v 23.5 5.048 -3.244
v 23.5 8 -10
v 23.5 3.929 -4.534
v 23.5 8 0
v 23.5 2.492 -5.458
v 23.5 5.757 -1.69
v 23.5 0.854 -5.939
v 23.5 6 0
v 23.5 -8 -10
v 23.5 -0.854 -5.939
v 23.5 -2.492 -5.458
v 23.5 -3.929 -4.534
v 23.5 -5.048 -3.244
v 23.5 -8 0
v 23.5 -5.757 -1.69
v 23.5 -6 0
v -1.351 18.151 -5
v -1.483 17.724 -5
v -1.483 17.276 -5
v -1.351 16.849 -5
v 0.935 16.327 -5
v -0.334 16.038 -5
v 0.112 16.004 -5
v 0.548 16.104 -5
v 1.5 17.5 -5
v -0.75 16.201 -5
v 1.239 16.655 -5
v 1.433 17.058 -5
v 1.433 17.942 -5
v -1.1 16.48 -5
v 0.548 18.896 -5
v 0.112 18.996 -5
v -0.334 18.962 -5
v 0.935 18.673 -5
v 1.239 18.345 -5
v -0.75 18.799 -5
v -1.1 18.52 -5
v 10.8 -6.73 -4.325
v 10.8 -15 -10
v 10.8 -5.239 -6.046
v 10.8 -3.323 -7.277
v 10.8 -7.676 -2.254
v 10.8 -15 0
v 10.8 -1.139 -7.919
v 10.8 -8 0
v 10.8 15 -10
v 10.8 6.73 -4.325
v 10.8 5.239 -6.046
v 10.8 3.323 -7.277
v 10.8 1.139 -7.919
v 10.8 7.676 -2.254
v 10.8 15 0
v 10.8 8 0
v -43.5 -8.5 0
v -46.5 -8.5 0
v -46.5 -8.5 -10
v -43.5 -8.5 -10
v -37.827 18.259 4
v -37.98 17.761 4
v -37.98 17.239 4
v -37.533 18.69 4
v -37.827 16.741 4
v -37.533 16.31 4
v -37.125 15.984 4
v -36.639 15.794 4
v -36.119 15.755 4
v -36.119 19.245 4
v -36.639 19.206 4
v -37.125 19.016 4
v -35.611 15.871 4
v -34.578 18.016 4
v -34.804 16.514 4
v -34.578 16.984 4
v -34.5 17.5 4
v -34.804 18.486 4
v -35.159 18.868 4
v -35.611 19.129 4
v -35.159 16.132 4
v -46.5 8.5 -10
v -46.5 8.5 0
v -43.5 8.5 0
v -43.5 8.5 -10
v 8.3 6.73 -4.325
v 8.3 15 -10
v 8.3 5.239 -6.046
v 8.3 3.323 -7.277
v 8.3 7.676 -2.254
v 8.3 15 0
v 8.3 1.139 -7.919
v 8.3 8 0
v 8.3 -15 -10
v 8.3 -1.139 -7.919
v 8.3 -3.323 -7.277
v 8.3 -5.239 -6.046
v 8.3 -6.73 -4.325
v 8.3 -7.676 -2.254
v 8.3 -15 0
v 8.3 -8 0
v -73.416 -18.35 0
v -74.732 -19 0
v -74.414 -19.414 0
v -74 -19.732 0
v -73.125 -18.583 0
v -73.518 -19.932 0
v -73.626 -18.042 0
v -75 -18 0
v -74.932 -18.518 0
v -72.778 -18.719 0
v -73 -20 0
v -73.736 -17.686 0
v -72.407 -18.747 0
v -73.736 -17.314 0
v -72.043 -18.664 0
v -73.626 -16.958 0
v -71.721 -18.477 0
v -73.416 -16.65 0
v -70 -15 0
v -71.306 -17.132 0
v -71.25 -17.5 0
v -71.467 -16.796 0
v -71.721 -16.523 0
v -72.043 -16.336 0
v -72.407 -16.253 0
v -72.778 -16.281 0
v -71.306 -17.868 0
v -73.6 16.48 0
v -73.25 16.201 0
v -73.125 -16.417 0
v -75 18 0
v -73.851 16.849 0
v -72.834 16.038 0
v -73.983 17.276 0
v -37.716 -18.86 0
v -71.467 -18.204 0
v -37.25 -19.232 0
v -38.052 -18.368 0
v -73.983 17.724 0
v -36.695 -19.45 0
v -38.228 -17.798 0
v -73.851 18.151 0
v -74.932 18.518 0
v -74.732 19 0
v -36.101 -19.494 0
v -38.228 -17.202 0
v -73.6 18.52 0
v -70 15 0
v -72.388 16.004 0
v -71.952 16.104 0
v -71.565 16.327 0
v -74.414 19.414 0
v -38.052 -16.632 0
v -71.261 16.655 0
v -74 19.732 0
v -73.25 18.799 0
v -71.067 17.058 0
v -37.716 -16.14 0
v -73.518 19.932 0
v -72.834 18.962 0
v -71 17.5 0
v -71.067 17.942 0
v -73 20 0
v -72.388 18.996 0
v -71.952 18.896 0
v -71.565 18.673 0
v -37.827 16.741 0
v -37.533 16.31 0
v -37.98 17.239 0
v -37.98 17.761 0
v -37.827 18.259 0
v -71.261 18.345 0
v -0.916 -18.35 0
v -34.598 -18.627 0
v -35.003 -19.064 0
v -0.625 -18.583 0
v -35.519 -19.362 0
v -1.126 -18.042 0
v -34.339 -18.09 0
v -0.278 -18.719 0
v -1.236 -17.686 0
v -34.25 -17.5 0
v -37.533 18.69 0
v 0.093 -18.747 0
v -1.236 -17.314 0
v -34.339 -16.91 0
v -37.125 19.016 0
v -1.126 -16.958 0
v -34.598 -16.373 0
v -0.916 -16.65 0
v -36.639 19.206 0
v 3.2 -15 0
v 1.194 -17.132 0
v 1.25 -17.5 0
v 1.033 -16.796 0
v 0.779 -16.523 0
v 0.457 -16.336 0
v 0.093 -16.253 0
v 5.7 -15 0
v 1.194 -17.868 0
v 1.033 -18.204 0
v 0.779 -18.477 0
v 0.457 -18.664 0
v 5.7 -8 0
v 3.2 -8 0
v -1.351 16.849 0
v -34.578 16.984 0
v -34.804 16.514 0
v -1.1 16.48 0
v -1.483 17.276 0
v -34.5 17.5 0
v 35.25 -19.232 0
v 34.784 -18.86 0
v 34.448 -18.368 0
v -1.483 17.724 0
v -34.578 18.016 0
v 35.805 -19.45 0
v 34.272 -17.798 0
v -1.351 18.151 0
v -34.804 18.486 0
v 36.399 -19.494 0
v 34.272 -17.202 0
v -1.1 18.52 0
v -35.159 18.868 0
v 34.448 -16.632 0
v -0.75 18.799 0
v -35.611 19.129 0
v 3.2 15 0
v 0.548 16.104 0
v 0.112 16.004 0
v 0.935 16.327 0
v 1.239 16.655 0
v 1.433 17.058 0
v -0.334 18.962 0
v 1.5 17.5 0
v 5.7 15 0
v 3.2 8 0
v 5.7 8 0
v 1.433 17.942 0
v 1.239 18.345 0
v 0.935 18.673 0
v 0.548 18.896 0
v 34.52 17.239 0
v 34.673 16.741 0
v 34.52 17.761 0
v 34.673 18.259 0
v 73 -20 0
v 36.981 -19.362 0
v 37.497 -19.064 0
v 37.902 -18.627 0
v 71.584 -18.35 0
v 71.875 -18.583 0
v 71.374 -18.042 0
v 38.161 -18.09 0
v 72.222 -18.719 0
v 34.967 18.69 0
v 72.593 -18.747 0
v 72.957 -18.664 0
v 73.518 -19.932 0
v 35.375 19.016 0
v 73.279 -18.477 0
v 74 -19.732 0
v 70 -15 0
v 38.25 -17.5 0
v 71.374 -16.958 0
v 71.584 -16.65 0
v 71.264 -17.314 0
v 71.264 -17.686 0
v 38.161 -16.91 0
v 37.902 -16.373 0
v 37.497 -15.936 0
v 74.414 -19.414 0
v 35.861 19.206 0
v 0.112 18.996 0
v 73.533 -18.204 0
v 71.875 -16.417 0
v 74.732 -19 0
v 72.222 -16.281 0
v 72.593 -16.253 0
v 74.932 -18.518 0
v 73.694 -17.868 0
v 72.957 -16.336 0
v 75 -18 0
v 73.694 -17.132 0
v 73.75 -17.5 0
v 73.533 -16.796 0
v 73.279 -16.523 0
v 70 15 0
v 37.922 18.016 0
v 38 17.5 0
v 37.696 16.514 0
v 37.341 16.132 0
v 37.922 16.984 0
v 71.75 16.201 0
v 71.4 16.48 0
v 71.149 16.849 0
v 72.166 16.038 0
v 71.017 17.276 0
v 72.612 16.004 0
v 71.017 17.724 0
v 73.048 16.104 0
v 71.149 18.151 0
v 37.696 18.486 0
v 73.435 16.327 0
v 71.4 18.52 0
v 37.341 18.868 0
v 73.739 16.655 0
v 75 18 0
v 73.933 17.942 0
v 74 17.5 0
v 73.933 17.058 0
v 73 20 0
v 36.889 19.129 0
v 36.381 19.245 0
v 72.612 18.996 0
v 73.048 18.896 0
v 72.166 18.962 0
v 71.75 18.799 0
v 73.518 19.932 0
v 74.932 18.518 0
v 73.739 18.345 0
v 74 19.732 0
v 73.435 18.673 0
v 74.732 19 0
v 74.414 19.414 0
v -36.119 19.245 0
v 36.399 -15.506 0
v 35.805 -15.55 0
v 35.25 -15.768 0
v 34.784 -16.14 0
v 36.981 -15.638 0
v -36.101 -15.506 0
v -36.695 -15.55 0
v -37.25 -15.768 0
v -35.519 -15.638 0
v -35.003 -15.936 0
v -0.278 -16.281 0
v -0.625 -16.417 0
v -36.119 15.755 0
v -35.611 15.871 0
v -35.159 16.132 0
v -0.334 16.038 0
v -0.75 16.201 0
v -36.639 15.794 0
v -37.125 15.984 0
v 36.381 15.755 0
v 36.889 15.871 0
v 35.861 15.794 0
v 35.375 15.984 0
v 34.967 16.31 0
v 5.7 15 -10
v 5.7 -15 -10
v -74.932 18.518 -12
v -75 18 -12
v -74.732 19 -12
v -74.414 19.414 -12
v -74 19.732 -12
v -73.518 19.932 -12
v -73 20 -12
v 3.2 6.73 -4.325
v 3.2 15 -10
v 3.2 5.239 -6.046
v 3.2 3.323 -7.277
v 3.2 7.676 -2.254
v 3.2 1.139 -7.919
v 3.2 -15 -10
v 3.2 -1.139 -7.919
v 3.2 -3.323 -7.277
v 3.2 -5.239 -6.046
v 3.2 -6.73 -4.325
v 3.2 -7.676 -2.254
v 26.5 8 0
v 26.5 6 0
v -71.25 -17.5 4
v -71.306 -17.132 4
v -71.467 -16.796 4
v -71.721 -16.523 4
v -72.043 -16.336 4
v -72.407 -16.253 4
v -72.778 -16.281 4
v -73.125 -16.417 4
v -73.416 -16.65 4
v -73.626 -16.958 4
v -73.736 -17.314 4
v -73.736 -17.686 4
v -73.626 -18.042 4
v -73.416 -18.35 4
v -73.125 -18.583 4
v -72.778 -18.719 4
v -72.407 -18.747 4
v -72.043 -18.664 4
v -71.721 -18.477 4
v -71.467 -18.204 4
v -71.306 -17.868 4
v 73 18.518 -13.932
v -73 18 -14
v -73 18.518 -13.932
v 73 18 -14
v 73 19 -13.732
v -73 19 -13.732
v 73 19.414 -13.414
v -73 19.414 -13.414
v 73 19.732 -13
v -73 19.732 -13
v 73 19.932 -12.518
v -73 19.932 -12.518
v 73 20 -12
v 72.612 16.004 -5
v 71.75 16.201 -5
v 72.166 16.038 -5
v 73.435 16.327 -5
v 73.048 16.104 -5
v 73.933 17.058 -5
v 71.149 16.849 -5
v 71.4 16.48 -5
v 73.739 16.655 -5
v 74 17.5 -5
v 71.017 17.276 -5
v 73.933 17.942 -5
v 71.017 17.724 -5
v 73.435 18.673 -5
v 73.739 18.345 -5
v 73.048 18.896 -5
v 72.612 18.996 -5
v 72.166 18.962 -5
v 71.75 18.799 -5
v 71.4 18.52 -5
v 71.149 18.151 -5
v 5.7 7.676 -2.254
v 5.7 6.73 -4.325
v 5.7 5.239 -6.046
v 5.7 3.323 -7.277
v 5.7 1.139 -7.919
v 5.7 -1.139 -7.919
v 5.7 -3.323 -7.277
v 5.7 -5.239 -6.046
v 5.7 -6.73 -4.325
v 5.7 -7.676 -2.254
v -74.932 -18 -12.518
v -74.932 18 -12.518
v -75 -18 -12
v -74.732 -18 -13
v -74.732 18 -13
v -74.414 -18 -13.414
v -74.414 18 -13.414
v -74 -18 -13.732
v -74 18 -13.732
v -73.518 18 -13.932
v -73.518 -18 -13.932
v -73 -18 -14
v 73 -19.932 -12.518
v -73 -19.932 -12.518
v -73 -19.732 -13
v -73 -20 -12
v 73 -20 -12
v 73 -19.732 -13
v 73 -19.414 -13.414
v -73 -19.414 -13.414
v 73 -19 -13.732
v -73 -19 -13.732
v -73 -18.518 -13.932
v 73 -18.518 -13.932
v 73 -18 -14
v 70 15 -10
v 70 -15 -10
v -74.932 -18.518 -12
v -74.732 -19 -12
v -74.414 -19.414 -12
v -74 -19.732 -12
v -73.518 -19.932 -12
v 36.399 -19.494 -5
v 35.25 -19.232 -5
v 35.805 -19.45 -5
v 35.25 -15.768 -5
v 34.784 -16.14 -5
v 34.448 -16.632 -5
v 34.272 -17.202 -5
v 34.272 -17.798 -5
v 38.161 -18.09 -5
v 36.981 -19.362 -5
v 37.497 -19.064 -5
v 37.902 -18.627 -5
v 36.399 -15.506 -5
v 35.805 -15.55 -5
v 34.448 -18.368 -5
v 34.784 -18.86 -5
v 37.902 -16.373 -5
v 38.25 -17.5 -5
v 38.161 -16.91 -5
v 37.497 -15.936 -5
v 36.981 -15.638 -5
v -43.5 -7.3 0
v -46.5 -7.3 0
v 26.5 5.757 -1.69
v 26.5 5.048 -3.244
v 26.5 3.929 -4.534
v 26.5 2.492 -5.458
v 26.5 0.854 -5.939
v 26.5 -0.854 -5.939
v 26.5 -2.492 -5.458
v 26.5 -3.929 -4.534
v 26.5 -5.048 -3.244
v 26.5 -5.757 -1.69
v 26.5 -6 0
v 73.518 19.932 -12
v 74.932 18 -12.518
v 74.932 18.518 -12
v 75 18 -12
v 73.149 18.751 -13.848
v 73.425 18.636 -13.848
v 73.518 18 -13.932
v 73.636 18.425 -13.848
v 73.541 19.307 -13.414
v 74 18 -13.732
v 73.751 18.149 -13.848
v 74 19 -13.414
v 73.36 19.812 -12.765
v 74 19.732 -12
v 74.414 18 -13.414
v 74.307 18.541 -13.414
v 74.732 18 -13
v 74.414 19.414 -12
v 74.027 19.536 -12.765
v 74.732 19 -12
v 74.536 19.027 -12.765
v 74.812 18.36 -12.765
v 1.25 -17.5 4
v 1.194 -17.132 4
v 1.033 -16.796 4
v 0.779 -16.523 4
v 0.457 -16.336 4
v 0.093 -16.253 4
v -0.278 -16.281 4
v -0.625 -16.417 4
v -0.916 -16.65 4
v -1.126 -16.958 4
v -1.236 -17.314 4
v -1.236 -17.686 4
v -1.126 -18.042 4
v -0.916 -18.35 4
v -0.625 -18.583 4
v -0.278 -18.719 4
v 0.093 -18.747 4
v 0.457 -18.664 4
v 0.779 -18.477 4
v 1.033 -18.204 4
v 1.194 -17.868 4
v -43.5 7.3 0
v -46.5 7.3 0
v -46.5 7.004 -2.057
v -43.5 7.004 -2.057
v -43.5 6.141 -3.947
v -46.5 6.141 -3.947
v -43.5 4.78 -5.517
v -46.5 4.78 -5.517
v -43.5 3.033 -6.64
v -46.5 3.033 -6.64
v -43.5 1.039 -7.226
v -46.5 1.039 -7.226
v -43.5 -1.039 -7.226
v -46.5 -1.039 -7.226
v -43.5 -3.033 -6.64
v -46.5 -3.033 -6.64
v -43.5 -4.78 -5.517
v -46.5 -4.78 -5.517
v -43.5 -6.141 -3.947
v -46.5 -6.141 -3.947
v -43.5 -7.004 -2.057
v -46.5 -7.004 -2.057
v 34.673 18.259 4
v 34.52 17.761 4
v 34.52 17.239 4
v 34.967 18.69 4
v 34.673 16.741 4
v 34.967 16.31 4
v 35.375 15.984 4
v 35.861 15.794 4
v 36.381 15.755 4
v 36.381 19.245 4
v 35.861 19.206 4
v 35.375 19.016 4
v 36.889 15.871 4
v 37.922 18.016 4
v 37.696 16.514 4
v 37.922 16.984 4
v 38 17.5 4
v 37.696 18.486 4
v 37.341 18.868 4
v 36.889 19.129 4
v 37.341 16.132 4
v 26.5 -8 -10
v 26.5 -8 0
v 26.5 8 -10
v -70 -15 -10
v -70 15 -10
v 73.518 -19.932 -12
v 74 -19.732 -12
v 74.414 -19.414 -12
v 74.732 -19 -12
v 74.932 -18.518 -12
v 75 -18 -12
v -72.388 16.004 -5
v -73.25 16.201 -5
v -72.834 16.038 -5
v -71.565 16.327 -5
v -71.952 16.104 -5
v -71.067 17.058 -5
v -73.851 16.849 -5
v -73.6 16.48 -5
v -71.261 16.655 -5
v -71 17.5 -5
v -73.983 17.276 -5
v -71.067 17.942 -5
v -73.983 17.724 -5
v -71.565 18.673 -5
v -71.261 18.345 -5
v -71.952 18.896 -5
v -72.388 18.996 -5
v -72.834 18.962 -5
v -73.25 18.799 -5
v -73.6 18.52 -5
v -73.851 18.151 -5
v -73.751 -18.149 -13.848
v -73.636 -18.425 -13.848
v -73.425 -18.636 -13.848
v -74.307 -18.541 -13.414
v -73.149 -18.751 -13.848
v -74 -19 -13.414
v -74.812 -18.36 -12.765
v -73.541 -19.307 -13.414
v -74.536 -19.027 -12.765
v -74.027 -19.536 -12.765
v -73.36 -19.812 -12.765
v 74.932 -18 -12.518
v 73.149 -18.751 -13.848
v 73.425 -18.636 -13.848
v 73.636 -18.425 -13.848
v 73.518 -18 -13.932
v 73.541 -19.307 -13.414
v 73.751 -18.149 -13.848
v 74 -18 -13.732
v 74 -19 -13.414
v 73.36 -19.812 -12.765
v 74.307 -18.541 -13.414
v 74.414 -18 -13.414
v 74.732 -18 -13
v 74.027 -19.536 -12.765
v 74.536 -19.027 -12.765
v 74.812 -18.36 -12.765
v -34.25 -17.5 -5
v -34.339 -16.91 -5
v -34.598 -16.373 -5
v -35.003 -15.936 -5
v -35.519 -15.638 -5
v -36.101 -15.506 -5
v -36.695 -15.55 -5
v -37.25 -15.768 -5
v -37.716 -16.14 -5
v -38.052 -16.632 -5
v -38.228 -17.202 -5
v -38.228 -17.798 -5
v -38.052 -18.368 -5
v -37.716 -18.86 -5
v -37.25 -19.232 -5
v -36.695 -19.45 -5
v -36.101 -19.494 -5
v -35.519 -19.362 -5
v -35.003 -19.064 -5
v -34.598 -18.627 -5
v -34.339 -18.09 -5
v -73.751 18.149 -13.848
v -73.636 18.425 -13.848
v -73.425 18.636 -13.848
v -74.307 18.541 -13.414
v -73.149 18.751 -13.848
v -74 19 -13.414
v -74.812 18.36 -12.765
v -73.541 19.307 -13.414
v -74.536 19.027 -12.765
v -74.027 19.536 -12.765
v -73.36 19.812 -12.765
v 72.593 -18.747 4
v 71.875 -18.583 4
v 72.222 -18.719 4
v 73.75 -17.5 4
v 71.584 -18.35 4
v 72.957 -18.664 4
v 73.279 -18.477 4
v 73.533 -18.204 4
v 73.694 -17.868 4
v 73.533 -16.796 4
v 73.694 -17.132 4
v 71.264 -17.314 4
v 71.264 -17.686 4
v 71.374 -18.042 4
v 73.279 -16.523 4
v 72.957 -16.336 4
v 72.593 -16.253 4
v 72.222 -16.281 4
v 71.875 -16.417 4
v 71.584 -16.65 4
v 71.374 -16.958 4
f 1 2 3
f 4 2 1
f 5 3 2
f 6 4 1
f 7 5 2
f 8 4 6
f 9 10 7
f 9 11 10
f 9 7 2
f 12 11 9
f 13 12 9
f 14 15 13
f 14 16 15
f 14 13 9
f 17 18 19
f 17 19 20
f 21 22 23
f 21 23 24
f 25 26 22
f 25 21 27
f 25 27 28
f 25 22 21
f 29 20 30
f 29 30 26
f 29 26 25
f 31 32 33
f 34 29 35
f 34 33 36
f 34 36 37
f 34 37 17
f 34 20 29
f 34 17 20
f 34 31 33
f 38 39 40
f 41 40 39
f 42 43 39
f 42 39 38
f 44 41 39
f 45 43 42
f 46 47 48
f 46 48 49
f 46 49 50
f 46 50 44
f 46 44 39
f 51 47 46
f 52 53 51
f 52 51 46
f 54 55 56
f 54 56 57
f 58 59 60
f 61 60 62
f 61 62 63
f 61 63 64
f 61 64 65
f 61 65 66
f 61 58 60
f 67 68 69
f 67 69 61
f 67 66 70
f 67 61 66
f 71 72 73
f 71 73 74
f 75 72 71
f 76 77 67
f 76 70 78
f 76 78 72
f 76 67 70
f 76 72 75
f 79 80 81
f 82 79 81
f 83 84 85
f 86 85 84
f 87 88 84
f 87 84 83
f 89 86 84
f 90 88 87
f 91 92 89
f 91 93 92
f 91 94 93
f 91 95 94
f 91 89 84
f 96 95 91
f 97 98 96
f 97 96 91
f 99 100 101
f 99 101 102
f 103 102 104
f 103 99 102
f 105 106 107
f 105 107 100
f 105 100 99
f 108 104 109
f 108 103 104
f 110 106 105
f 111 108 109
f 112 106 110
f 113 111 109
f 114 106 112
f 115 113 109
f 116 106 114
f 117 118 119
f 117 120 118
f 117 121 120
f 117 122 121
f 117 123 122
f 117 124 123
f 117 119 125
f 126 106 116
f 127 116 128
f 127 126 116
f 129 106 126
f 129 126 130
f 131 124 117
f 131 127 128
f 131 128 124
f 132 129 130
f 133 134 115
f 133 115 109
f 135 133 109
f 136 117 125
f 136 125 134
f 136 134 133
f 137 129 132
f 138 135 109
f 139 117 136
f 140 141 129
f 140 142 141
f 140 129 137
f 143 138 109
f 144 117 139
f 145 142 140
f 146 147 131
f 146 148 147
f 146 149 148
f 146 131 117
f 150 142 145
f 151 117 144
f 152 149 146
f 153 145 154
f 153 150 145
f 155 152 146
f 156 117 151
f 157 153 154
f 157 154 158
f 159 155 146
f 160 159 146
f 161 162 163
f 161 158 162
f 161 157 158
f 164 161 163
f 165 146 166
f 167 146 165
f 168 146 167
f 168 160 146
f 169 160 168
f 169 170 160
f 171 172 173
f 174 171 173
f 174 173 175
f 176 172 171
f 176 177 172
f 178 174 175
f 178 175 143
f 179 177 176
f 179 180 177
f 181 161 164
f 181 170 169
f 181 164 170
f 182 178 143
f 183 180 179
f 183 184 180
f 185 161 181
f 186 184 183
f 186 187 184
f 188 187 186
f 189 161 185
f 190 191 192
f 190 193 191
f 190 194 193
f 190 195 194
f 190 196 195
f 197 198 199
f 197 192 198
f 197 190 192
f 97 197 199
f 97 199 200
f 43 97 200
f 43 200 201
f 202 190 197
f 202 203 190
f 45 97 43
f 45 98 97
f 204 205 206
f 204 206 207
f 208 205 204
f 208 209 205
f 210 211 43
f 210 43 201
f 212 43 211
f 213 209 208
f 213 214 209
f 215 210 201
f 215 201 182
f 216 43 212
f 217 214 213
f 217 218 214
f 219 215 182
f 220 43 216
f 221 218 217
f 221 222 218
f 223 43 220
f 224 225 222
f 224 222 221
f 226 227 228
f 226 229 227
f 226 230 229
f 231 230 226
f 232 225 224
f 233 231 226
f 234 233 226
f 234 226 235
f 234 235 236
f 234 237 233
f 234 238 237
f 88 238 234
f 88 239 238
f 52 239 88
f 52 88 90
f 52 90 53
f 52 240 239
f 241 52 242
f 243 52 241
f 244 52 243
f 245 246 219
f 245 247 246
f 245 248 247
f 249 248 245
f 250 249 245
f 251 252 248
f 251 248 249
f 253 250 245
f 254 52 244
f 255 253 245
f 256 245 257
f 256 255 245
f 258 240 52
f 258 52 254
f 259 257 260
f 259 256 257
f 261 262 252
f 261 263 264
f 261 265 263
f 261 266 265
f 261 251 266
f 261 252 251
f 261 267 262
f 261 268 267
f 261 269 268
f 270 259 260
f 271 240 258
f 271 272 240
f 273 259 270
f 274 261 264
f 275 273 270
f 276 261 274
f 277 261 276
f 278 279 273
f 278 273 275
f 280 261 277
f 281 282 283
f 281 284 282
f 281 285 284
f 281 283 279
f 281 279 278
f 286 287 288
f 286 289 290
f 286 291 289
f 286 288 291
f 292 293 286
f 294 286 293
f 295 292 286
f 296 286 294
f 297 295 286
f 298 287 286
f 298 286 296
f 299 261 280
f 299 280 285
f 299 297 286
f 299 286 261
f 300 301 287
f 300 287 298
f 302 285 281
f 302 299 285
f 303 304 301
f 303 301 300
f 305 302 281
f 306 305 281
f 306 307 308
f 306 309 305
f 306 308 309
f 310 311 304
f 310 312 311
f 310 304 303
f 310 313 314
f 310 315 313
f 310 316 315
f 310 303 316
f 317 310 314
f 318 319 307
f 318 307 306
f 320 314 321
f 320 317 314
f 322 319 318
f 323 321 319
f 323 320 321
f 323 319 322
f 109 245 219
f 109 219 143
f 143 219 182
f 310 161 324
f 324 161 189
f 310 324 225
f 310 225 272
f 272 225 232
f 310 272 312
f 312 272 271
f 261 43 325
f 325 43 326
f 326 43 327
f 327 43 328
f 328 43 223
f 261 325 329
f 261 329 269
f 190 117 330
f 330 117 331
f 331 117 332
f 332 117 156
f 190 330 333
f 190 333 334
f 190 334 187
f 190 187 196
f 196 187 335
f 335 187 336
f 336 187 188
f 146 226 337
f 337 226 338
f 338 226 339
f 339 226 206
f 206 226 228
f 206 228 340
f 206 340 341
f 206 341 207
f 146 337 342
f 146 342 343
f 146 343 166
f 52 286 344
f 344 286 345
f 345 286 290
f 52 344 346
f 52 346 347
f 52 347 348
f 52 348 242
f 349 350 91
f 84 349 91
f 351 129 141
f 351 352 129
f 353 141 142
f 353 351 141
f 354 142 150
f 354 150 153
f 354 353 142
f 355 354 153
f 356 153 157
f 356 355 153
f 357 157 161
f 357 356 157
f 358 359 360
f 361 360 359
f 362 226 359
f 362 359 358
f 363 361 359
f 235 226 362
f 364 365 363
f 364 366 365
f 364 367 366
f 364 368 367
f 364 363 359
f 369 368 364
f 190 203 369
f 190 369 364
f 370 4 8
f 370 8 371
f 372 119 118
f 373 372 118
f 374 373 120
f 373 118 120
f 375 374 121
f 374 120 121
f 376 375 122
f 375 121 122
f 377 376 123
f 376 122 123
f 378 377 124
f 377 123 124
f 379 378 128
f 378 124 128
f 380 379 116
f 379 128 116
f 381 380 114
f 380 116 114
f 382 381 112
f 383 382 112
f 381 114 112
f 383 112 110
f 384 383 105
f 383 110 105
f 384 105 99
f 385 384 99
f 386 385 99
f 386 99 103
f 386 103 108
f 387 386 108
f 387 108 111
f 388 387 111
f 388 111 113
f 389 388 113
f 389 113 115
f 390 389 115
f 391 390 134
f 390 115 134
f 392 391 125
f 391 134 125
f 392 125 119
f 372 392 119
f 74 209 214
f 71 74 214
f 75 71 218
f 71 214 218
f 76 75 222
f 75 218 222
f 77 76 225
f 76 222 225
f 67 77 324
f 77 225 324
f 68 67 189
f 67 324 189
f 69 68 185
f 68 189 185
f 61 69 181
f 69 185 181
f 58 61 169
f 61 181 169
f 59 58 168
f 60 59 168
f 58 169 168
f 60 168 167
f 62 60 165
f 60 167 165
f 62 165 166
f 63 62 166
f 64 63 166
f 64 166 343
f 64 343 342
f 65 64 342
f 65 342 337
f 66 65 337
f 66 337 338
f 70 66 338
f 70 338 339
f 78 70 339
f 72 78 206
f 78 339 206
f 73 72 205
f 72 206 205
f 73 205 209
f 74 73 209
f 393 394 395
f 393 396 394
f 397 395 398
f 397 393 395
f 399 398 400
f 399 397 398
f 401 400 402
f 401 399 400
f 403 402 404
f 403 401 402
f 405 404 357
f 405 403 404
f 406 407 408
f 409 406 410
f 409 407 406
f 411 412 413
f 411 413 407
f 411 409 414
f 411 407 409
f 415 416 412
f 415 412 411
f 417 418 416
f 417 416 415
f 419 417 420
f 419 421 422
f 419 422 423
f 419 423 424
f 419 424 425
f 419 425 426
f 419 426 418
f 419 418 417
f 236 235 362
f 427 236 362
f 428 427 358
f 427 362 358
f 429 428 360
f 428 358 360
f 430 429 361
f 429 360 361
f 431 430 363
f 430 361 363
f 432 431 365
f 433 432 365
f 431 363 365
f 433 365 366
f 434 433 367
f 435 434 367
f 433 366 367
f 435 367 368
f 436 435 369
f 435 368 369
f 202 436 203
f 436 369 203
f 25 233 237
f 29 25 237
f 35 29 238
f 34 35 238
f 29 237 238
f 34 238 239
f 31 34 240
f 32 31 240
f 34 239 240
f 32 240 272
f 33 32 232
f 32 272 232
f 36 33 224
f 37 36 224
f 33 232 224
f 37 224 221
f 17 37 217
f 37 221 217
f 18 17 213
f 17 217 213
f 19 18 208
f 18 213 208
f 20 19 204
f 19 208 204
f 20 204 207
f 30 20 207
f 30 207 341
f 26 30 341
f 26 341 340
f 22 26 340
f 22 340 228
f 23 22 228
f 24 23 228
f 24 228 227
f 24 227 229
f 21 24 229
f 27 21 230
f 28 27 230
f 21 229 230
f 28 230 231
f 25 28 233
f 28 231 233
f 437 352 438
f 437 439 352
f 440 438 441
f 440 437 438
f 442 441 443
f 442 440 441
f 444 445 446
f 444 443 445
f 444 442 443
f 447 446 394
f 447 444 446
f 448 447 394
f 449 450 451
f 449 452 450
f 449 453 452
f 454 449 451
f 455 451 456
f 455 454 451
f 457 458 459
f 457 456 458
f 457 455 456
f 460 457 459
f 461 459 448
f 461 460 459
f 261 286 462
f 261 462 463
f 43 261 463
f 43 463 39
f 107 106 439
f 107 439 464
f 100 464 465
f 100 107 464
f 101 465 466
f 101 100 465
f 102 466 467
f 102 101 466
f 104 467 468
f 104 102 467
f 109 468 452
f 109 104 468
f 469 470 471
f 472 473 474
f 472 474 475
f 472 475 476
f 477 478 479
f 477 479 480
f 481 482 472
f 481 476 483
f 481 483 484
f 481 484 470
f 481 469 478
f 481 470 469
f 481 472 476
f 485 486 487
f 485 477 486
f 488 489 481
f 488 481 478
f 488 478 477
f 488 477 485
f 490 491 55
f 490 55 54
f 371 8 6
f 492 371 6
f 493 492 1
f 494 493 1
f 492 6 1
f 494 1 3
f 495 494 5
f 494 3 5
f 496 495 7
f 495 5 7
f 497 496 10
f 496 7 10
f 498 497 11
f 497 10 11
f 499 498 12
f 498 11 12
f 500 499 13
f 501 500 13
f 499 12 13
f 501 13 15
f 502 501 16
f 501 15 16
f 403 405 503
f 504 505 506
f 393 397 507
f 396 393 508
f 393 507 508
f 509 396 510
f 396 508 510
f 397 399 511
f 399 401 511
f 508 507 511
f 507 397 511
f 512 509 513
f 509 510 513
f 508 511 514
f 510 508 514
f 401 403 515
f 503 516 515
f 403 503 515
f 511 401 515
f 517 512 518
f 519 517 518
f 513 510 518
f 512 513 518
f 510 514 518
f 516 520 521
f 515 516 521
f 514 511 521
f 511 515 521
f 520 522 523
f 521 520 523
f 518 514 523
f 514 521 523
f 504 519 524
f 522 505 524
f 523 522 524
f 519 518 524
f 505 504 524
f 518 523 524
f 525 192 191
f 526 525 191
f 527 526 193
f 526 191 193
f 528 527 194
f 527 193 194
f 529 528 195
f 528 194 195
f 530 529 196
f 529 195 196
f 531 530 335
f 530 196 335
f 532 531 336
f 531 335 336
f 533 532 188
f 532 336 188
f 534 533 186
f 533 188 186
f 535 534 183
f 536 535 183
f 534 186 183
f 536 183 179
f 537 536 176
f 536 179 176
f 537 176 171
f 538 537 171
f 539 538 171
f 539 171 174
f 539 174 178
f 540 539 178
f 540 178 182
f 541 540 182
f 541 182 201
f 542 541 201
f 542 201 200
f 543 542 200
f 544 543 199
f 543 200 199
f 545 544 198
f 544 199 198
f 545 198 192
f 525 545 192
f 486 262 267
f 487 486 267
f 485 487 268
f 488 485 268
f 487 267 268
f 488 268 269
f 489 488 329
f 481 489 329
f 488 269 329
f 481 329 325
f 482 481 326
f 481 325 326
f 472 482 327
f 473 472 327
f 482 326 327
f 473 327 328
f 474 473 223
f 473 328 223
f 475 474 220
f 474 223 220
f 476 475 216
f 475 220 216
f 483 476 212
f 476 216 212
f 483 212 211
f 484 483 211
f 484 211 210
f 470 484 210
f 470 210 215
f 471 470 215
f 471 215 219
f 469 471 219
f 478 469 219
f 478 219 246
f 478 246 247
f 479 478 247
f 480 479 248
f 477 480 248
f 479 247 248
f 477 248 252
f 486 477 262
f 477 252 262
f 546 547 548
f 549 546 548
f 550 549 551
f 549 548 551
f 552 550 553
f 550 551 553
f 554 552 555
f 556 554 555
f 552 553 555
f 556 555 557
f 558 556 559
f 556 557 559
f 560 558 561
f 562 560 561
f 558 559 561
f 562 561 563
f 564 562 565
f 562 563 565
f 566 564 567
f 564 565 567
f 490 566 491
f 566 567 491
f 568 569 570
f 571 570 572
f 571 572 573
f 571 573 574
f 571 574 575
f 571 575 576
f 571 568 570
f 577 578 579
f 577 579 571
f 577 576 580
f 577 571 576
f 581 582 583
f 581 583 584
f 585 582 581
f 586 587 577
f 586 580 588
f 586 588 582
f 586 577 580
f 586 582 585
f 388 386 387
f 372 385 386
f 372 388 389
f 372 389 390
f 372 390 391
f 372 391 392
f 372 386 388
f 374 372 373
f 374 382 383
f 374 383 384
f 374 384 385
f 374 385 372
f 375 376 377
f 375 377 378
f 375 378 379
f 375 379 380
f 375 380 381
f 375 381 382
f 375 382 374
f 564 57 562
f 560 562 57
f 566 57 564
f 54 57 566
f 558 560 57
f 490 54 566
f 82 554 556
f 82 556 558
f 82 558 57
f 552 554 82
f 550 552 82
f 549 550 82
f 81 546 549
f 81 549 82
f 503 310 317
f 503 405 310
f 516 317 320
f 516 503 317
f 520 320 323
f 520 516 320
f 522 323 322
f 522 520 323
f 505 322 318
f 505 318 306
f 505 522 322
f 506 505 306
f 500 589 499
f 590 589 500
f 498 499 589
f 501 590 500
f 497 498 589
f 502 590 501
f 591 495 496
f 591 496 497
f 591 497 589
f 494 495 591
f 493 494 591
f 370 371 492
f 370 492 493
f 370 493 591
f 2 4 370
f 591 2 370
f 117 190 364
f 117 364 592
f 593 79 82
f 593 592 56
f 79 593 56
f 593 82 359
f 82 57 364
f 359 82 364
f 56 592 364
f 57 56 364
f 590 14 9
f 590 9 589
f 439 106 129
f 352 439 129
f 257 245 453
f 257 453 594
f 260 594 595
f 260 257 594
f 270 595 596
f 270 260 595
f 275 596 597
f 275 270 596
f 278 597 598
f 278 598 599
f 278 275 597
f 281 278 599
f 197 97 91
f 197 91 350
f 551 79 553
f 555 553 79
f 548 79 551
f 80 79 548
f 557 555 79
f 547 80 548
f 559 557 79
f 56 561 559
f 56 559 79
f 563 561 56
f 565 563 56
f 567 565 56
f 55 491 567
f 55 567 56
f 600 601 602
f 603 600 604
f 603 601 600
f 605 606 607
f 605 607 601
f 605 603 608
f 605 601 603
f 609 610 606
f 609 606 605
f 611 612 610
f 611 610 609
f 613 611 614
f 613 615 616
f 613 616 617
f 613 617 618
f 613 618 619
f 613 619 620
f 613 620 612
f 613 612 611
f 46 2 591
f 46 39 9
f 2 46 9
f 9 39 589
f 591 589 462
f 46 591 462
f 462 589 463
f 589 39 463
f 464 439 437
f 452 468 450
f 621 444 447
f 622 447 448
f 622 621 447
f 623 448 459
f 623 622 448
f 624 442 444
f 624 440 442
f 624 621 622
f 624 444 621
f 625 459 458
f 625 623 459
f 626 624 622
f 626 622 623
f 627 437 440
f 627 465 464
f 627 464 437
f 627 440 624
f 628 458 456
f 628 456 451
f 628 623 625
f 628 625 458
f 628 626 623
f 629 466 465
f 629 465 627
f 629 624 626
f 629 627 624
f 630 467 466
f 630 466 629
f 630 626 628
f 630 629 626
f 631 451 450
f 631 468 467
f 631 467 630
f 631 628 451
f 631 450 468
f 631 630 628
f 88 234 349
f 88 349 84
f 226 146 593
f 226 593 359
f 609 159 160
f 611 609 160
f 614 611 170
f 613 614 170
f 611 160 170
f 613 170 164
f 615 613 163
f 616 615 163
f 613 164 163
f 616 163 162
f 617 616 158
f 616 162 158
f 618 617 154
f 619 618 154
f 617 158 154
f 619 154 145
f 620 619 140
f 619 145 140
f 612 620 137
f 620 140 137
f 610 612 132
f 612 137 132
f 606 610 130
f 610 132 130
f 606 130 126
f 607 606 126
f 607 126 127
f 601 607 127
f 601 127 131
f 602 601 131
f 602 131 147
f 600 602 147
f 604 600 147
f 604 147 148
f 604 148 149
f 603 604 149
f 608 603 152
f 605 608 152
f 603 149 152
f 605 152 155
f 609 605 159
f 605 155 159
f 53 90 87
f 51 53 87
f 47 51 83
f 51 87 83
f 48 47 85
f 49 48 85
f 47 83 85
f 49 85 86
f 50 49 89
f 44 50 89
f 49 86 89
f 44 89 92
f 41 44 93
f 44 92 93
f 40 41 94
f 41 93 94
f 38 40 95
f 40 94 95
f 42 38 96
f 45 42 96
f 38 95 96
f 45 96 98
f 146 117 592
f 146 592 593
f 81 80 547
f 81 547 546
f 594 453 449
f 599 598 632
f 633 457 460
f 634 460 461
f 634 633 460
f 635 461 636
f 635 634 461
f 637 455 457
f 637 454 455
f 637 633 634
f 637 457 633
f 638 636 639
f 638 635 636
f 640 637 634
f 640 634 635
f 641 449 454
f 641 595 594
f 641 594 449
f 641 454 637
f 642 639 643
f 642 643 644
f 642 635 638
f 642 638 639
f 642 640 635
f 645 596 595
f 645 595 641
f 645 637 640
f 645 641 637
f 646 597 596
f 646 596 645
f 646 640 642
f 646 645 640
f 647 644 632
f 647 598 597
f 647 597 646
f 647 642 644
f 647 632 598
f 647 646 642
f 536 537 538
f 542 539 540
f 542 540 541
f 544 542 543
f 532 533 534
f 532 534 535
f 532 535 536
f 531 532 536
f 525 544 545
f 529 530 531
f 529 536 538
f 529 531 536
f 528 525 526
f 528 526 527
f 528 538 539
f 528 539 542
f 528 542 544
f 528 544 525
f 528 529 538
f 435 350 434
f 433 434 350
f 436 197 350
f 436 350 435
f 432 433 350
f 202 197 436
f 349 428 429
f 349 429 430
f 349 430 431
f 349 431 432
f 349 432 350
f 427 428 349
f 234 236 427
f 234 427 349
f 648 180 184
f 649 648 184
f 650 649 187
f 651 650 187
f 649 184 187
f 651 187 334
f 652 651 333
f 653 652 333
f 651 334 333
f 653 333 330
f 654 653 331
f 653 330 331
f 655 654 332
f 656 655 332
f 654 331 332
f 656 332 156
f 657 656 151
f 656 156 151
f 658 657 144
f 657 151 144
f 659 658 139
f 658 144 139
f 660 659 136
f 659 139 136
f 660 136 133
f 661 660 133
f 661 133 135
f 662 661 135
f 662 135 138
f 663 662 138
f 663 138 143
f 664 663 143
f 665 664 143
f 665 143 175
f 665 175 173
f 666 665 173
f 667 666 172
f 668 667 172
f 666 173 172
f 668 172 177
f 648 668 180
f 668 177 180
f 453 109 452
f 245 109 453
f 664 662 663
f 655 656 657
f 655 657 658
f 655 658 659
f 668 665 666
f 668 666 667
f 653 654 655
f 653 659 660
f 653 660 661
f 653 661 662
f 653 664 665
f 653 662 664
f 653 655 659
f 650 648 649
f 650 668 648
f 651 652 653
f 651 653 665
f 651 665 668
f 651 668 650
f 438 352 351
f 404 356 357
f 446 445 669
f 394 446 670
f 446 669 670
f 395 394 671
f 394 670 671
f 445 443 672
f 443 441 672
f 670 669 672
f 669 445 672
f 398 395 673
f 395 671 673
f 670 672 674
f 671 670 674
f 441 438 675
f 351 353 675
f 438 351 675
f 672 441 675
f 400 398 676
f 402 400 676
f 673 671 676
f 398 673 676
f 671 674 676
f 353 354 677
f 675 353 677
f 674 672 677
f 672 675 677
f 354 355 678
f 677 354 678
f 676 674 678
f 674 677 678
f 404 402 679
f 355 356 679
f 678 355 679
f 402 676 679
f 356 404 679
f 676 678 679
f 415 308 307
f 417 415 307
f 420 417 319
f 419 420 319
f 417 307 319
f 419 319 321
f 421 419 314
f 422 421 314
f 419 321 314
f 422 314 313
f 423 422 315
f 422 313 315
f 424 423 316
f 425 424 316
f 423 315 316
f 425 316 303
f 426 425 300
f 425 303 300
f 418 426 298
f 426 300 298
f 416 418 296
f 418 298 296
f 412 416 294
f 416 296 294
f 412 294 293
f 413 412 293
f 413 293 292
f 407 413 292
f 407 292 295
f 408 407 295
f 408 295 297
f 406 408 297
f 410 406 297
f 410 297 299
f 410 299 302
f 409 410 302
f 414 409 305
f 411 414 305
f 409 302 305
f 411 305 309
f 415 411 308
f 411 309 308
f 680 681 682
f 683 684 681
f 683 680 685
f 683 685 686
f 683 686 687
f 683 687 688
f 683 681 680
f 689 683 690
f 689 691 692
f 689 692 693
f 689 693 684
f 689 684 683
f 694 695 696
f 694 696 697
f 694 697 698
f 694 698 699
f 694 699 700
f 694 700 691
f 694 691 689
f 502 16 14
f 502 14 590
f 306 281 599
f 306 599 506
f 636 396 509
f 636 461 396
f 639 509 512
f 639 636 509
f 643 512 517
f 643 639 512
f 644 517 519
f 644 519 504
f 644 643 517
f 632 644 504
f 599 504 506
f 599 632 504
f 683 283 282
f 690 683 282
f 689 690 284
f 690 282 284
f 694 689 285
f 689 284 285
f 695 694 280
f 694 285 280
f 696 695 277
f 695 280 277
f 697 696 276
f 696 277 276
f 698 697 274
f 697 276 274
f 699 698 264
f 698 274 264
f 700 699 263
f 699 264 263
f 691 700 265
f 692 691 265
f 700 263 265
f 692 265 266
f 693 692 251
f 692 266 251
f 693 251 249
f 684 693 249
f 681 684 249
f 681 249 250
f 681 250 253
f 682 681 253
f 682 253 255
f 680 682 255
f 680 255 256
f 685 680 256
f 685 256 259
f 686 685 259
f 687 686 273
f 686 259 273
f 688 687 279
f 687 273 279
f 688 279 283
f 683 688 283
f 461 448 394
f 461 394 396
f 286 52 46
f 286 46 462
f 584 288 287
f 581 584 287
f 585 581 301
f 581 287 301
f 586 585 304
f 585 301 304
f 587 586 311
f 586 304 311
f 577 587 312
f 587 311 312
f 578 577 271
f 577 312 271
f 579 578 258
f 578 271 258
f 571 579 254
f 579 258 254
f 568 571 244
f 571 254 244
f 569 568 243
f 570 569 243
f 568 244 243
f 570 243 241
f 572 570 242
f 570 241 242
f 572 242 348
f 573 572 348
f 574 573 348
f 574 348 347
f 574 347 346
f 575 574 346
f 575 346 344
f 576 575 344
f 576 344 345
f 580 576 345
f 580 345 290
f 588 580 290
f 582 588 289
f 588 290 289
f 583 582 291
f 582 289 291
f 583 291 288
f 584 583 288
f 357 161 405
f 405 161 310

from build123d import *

# Parameters (mm, degrees)
F0_W      = 3
F0_H      = 1
F0_H_2    = 15
F1_DEPTH  = 10
F0_W_2    = 150.0000016391
F0_H_3    = 40.0000016391
F0_R      = 1.25
F0_R_2    = 2
F0_R_3    = 1.5
F0_R_4    = 1.75
F0_W_3    = 2.5
F0_H_4    = 7.5
F0_H_5    = 3
F0_H_6    = 10
F3_DEPTH  = 3
F5_DEPTH  = 7.6
F7_DEPTH  = 3
F8_DEPTH  = 4
F9_DEPTH  = 5
F10_W     = 150.0000016391
F10_H     = 40.0000016391
F10_W_2   = 73.2
F10_H_2   = 30
F10_W_3   = 2.6
F10_W_4   = 59.2
F11_DEPTH = 4
F13_R     = 2


with BuildPart() as f1:
    # F0 (on Top) → F1 (new body)
    with BuildSketch(Plane.XY):
        with Locations((-45, 8)):
            Rectangle(F0_W, F0_H)
        with Locations((-45, 0)):
            Rectangle(F0_W, F0_H_2)
        with Locations((-45, -8)):
            Rectangle(F0_W, F0_H)
    extrude(amount=-F1_DEPTH)

    # F2 (on face) → F3 (cut, through all)
    with BuildSketch(Plane(origin=(-46.5, 0, 0), x_dir=(0, -1, 0), z_dir=(-1, 0, 0))):
        with BuildLine():
            ThreePointArc((-7.3, 0), (0, -7.3), (7.3, 0))
            Line((7.3, 0), (-7.3, 0))
        make_face()
    extrude(amount=-F3_DEPTH, mode=Mode.SUBTRACT)


with BuildPart() as f1b:
    # F0 (on Top) → F1, piece 2 (new body)
    with BuildSketch(Plane.XY):
        Rectangle(F0_W_2, F0_H_3)
        with Locations((-72.5000004098, -17.5000004098)):
            Circle(F0_R, mode=Mode.SUBTRACT)
        with Locations((-36.2500004098, -17.5000004098)):
            Circle(F0_R_2, mode=Mode.SUBTRACT)
        with Locations((-4.098e-07, -17.5000004098)):
            Circle(F0_R, mode=Mode.SUBTRACT)
        with Locations((36.2499995902, -17.5000004098)):
            Circle(F0_R_2, mode=Mode.SUBTRACT)
        with Locations((72.4999995902, -17.5000004098)):
            Circle(F0_R, mode=Mode.SUBTRACT)
        Polygon((-70, -15), (-70, 15), (3.2, 15), (5.7, 15), (8.3, 15), (10.8, 15), (70, 15), (70, -15), (10.8, -15), (8.3, -15), (5.7, -15), (3.2, -15), align=None, mode=Mode.SUBTRACT)
        with Locations((-72.5000004098, 17.4999995902)):
            Circle(F0_R_3, mode=Mode.SUBTRACT)
        with Locations((-36.2500004098, 17.4999995902)):
            Circle(F0_R_4, mode=Mode.SUBTRACT)
        with Locations((-4.098e-07, 17.4999995902)):
            Circle(F0_R_3, mode=Mode.SUBTRACT)
        with Locations((36.2499995902, 17.4999995902)):
            Circle(F0_R_4, mode=Mode.SUBTRACT)
        with Locations((72.4999995902, 17.4999995902)):
            Circle(F0_R_3, mode=Mode.SUBTRACT)
        with Locations((9.55, 0)):
            Rectangle(F0_W_3, F0_H_2)
        with Locations((4.45, 0)):
            Rectangle(F0_W_3, F0_H_2)
        with Locations((4.45, 11.25)):
            Rectangle(F0_W_3, F0_H_4)
        with Locations((9.55, 11.25)):
            Rectangle(F0_W_3, F0_H_4)
        with Locations((4.45, -11.25)):
            Rectangle(F0_W_3, F0_H_4)
        with Locations((9.55, -11.25)):
            Rectangle(F0_W_3, F0_H_4)
        with Locations((-36.2500004098, -17.5000004098)):
            Circle(F0_R_2)
        with Locations((36.2499995902, -17.5000004098)):
            Circle(F0_R_2)
        with Locations((-36.2500004098, 17.4999995902)):
            Circle(F0_R_4)
        with Locations((36.2499995902, 17.4999995902)):
            Circle(F0_R_4)
        with Locations((72.4999995902, 17.4999995902)):
            Circle(F0_R_3)
        with Locations((-4.098e-07, 17.4999995902)):
            Circle(F0_R_3)
        with Locations((-72.5000004098, 17.4999995902)):
            Circle(F0_R_3)
        with Locations((-72.5000004098, -17.5000004098)):
            Circle(F0_R)
        with Locations((-4.098e-07, -17.5000004098)):
            Circle(F0_R)
        with Locations((72.4999995902, -17.5000004098)):
            Circle(F0_R)
    extrude(amount=-F1_DEPTH)

    # F4 (on face) → F5 (cut, through all)
    with BuildSketch(Plane(origin=(3.2, 0, 0), x_dir=(0, -1, 0), z_dir=(-1, 0, 0))):
        with BuildLine():
            ThreePointArc((-8, 0), (0, -8), (8, 0))
            Line((8, 0), (-8, 0))
        make_face()
    extrude(amount=-F5_DEPTH, mode=Mode.SUBTRACT)

    # F0 (on Top) → F8 (join)
    with BuildSketch(Plane.XY):
        with Locations((-72.5000004098, -17.5000004098)):
            Circle(F0_R)
        with Locations((-4.098e-07, -17.5000004098)):
            Circle(F0_R)
        with Locations((72.4999995902, -17.5000004098)):
            Circle(F0_R)
        with Locations((-36.2500004098, 17.4999995902)):
            Circle(F0_R_4)
        with Locations((36.2499995902, 17.4999995902)):
            Circle(F0_R_4)
    extrude(amount=F8_DEPTH)

    # F0 (on Top) → F9 (cut)
    with BuildSketch(Plane.XY):
        with Locations((-4.098e-07, 17.4999995902)):
            Circle(F0_R_3)
        with Locations((72.4999995902, 17.4999995902)):
            Circle(F0_R_3)
        with Locations((-72.5000004098, 17.4999995902)):
            Circle(F0_R_3)
        with Locations((-36.2500004098, -17.5000004098)):
            Circle(F0_R_2)
        with Locations((36.2499995902, -17.5000004098)):
            Circle(F0_R_2)
    extrude(amount=-F9_DEPTH, mode=Mode.SUBTRACT)


with BuildPart() as f1c:
    # F0 (on Top) → F1, piece 3 (new body)
    with BuildSketch(Plane.XY):
        with Locations((25, 6.5)):
            Rectangle(F0_W, F0_H_5)
        with Locations((25, 0)):
            Rectangle(F0_W, F0_H_6)
        with Locations((25, -6.5)):
            Rectangle(F0_W, F0_H_5)
    extrude(amount=-F1_DEPTH)

    # F6 (on face) → F7 (cut, through all)
    with BuildSketch(Plane(origin=(23.5, 0, 0), x_dir=(0, -1, 0), z_dir=(-1, 0, 0))):
        with BuildLine():
            ThreePointArc((-6, 0), (0, -6), (6, 0))
            Line((6, 0), (-6, 0))
        make_face()
    extrude(amount=-F7_DEPTH, mode=Mode.SUBTRACT)


with BuildPart() as f11:
    # F10 (on face) → F11 (new body)
    with BuildSketch(Plane(origin=(0, 0, -10), x_dir=(1, 0, 0), z_dir=(0, 0, -1))):
        Rectangle(F10_W, F10_H)
        with Locations((-33.4, 0)):
            Rectangle(F10_W_2, F10_H_2, mode=Mode.SUBTRACT)
        with Locations((7, 0)):
            Rectangle(F10_W_3, F10_H_2, mode=Mode.SUBTRACT)
        with Locations((40.4, 0)):
            Rectangle(F10_W_4, F10_H_2, mode=Mode.SUBTRACT)
        with Locations((-33.4, 0)):
            Rectangle(F10_W_2, F10_H_2)
        with Locations((40.4, 0)):
            Rectangle(F10_W_4, F10_H_2)
        with Locations((7, 0)):
            Rectangle(F10_W_3, F10_H_2)
    extrude(amount=F11_DEPTH)

    # F12: union F1c, F1b, F1
    add(f1c.part)
    add(f1b.part)
    add(f1.part)

    # F13
    f13_edges = [f11.edges().sort_by_distance(p)[0] for p in [
        (-75.000001, -20.000001, -7),
        (75.000001, -20.000001, -7),
        (75.000001, 20.000001, -7),
        (-75.000001, 20.000001, -7),
        (-75.000001, 0, -14),
        (0, -20.000001, -14),
        (0, 20.000001, -14),
        (75.000001, 0, -14),
    ]]
    fillet(f13_edges, radius=F13_R)


solid = f11.part
